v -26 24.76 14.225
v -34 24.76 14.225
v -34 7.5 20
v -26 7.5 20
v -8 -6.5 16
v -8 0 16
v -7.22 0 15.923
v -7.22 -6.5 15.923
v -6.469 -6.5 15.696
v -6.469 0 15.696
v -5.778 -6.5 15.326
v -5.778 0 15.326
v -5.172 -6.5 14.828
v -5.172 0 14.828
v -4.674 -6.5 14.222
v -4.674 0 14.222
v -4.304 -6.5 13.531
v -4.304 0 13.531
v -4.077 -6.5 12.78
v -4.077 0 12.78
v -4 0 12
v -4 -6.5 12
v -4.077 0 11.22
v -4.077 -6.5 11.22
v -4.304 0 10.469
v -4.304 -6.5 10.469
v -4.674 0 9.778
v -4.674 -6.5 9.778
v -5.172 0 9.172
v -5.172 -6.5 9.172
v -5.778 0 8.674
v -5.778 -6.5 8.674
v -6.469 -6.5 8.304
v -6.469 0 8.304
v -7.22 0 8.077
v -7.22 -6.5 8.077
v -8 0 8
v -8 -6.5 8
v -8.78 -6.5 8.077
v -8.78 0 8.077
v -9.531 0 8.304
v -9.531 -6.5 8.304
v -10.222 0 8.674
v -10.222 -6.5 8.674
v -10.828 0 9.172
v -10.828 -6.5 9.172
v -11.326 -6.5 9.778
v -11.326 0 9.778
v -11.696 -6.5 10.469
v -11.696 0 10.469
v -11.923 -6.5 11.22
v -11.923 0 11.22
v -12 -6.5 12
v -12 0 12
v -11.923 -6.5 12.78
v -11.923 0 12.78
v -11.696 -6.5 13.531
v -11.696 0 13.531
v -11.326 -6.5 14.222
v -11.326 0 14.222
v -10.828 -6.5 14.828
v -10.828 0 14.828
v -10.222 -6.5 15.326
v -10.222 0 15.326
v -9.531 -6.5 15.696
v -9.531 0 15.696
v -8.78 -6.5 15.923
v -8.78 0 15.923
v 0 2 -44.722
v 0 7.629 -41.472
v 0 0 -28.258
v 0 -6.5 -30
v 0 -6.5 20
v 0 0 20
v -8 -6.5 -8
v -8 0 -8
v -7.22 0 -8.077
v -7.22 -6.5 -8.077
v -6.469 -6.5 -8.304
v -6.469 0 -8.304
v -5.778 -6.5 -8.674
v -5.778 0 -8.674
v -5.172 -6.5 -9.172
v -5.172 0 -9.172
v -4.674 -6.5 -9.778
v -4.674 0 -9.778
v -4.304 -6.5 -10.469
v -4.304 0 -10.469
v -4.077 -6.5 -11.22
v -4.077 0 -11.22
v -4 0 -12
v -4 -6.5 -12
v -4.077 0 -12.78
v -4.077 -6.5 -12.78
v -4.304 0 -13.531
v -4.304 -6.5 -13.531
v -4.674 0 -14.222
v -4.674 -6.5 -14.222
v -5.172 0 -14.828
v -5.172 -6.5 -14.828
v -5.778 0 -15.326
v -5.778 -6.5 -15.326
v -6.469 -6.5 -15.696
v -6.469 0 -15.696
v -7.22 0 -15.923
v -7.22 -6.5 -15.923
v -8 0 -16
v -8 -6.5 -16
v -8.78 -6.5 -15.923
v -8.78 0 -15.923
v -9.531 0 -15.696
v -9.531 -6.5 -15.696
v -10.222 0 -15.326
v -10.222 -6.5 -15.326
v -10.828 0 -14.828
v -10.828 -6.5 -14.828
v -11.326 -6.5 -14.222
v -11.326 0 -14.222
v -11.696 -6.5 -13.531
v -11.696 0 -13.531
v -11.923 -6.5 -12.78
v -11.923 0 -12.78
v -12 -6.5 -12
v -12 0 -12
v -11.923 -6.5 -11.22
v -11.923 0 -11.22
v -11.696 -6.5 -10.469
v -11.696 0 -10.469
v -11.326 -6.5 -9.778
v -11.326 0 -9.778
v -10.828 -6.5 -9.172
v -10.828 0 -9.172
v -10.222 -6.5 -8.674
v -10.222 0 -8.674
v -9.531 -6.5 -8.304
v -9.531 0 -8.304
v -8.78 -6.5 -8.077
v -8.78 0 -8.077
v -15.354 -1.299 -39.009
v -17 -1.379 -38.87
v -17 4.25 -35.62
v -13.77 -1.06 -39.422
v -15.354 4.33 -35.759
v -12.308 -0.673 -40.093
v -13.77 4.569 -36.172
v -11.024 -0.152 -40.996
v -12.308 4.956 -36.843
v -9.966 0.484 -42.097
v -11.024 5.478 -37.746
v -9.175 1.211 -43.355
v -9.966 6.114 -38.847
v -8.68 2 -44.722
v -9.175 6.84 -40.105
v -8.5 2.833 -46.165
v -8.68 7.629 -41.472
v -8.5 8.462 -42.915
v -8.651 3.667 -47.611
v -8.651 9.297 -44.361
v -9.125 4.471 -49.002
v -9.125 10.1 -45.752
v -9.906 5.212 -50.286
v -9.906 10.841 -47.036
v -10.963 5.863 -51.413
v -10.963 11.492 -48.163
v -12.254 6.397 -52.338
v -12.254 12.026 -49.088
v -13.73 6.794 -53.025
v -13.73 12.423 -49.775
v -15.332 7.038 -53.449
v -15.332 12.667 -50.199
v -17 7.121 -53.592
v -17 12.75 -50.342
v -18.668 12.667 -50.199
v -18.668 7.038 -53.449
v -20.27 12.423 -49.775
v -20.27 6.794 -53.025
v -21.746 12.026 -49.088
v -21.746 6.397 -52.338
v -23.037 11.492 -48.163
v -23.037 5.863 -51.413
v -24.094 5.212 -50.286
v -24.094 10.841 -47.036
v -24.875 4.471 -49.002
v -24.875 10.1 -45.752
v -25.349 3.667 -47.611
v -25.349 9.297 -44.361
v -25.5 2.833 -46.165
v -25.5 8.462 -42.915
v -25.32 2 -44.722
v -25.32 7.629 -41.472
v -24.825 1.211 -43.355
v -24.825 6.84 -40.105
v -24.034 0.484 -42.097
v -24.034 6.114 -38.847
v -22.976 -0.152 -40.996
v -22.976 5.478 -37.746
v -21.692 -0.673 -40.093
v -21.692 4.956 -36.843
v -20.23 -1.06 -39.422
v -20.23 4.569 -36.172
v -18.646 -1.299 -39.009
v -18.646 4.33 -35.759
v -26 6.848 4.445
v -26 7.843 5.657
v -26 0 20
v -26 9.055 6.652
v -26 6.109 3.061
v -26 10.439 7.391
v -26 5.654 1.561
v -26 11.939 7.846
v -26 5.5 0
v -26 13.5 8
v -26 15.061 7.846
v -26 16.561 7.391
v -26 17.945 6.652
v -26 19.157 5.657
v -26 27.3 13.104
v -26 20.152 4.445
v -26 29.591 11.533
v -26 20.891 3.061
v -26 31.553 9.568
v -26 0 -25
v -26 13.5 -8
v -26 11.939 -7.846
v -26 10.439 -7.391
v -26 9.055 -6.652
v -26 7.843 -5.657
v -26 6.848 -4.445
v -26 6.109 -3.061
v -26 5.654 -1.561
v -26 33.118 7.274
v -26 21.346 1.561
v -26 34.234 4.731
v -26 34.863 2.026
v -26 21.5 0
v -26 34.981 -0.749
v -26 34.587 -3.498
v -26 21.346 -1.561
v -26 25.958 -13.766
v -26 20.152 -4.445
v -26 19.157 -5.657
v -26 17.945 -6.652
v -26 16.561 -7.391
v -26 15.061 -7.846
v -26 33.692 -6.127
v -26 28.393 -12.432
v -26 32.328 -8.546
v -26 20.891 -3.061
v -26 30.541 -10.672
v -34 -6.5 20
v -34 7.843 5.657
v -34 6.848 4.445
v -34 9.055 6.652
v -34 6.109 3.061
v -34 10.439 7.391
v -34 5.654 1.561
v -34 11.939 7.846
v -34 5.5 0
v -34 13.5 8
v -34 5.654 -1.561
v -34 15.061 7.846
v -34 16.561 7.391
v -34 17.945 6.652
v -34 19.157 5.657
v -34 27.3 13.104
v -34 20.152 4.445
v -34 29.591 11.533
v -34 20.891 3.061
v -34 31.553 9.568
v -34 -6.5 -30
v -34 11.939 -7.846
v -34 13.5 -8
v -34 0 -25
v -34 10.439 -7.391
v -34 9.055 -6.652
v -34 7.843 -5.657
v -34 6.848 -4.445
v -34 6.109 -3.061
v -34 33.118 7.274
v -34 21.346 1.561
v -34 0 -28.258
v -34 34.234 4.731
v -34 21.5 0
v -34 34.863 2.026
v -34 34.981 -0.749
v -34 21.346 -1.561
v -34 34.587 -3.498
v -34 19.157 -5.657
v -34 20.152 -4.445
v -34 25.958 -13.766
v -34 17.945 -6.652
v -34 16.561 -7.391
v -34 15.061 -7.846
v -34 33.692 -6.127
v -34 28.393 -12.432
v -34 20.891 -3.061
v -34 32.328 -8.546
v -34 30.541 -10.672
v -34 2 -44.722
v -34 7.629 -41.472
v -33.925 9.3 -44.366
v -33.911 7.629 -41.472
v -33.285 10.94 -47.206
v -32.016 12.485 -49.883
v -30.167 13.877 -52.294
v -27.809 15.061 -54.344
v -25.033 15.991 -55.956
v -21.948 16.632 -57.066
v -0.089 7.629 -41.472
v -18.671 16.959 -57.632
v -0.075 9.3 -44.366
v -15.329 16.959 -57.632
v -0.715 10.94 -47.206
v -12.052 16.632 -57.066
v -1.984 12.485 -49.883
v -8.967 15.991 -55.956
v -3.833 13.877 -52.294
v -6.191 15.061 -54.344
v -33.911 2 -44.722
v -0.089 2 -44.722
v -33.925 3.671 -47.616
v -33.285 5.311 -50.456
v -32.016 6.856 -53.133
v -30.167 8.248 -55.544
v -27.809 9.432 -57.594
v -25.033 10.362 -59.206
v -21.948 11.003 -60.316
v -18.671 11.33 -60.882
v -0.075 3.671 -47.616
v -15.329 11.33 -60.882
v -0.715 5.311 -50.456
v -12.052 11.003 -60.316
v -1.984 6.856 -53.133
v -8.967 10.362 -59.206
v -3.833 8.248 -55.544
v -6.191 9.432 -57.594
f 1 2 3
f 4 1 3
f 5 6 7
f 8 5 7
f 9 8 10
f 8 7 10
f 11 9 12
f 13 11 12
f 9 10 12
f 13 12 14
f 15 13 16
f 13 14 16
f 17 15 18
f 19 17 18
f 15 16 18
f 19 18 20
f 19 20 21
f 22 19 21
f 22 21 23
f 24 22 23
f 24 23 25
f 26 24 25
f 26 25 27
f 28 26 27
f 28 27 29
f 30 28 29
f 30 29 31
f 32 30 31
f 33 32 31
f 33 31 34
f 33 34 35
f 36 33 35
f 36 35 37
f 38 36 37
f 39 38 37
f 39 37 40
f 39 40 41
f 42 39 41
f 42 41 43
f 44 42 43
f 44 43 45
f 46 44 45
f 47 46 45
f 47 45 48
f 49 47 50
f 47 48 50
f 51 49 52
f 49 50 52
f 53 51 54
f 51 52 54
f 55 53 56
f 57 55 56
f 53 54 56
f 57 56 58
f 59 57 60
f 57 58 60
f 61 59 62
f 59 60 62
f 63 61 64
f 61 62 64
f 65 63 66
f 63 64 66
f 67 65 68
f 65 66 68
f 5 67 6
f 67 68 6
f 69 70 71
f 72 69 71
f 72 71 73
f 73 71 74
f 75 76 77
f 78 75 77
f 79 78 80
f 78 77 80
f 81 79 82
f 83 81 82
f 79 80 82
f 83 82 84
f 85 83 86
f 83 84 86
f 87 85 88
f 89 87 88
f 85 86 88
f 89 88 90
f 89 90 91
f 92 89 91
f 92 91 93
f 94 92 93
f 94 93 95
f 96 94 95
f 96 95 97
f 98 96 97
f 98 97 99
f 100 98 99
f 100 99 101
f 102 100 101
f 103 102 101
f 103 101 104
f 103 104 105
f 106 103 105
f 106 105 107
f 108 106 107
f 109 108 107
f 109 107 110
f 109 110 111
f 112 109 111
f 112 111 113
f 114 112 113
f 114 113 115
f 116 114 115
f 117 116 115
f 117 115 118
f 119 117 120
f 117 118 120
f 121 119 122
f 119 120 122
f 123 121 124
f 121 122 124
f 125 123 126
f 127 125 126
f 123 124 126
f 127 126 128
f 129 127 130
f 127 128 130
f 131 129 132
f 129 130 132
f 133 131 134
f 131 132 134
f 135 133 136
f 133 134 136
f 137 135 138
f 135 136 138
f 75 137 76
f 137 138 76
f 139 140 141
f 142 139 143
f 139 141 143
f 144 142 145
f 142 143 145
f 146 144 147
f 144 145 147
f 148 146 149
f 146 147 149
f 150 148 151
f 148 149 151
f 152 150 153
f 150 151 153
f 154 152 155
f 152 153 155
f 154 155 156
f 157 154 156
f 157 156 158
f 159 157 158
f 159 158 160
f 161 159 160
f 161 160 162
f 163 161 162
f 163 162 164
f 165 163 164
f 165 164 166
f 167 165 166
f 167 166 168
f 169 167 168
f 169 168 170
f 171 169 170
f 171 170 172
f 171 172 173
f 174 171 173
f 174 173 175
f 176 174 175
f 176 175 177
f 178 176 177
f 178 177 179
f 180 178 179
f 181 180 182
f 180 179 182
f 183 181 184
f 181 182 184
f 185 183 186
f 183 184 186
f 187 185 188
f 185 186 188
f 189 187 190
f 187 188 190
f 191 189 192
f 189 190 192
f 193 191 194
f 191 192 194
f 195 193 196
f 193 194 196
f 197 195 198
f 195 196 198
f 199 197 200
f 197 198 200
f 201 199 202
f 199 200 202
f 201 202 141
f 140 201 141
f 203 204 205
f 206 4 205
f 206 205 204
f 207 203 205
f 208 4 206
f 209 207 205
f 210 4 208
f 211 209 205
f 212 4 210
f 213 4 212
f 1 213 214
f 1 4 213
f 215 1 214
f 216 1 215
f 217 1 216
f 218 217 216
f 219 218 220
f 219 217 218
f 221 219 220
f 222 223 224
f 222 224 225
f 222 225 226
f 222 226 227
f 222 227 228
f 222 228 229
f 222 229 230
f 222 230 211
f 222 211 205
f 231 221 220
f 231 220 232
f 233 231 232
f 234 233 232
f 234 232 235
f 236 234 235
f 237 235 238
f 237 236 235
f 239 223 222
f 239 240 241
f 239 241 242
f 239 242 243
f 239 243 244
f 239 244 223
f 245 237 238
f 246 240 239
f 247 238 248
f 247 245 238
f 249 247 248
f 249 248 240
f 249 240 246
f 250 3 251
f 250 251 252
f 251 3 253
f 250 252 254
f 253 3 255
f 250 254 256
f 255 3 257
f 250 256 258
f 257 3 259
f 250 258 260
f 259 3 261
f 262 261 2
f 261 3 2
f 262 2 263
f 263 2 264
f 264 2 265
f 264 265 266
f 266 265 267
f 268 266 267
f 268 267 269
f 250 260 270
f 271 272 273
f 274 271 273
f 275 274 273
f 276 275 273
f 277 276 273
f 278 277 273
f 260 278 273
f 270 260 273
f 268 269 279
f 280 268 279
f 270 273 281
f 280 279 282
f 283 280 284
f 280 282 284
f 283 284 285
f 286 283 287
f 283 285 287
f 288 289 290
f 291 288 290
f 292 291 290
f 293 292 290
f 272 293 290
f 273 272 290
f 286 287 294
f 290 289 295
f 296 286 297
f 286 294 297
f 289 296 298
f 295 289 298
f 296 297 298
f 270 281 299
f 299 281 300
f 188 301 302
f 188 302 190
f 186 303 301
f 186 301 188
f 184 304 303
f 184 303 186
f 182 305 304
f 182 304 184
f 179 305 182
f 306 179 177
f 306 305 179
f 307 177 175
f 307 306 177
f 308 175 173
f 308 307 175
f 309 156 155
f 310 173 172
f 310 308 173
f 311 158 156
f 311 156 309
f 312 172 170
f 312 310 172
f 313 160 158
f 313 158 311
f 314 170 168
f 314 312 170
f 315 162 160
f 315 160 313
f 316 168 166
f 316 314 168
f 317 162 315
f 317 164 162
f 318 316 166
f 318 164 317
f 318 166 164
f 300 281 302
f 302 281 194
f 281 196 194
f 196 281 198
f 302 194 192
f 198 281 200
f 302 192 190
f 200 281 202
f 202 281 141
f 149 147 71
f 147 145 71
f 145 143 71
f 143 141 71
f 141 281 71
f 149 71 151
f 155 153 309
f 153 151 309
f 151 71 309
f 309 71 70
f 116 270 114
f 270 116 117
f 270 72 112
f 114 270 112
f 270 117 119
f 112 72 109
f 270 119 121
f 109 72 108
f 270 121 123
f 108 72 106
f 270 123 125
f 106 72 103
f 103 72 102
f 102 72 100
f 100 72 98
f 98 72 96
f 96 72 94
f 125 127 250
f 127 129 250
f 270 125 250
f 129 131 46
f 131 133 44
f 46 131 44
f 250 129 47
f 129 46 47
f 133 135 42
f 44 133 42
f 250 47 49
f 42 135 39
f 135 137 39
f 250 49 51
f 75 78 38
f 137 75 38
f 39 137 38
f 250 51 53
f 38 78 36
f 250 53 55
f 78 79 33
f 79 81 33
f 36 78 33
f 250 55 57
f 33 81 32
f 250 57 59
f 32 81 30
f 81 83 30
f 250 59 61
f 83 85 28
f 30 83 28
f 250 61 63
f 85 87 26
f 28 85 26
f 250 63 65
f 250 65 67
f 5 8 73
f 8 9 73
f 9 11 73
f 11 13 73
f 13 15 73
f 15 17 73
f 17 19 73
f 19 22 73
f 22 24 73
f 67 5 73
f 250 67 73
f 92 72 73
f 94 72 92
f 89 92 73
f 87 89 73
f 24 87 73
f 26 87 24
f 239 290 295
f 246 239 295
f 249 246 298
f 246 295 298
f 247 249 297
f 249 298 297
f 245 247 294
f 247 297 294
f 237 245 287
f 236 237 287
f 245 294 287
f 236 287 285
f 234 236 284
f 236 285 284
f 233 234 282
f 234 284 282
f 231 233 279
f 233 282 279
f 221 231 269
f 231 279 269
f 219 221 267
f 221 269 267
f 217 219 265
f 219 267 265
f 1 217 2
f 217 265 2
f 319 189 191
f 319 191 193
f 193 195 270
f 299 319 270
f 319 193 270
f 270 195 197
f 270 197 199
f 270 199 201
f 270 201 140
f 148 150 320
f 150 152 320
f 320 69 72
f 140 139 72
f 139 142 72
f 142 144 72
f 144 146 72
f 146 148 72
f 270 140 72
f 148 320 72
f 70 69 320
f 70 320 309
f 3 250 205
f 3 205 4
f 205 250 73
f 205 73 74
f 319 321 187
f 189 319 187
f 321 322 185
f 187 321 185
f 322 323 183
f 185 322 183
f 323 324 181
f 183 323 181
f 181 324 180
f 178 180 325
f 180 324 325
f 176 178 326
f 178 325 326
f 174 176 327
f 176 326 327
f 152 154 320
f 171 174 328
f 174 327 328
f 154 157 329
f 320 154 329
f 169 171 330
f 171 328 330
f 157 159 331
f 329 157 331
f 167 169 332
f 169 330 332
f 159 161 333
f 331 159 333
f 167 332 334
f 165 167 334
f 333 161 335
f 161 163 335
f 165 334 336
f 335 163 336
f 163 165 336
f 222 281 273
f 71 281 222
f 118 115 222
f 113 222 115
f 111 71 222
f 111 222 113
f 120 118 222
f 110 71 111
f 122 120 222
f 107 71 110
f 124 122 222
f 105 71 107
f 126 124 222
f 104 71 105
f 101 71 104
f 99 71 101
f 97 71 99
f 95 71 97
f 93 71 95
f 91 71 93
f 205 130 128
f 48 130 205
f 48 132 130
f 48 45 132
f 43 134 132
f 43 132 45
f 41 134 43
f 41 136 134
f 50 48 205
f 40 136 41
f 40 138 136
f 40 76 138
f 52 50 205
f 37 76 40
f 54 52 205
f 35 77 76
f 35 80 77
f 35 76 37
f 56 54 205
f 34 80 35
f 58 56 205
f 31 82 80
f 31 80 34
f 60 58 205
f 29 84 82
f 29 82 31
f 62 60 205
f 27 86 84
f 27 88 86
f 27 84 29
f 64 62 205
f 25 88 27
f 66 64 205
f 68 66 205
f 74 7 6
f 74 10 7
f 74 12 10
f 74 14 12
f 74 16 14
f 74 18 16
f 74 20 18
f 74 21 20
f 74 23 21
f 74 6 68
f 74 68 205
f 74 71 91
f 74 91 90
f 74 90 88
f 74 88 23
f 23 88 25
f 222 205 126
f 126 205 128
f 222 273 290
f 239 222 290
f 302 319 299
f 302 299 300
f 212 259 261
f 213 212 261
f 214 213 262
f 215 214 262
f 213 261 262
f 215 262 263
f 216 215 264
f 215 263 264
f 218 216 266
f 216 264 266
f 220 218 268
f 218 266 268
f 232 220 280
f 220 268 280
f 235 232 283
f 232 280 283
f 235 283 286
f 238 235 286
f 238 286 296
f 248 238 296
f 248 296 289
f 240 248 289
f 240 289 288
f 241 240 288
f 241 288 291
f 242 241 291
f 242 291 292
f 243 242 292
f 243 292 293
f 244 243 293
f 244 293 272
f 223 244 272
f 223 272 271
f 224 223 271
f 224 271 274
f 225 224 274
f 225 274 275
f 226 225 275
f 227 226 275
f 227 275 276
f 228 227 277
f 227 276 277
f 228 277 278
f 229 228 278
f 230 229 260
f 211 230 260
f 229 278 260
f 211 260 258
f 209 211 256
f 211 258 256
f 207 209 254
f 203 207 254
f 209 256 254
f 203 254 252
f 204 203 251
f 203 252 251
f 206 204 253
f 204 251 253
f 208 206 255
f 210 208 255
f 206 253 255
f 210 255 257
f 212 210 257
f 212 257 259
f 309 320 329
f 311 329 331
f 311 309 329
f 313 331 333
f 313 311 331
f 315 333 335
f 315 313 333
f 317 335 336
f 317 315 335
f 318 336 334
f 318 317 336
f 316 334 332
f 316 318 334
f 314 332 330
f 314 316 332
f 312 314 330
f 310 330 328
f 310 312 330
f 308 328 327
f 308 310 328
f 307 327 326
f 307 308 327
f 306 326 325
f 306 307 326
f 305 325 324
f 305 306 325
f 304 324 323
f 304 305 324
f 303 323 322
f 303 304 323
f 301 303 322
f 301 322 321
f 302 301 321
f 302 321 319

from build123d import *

# Parameters (mm, degrees)
EXTRUDE_1_DEPTH     = 34
CUT_EXTRUDE_1_REACH = 72.355
SKETCH_2_R          = 4
EXTRUDE_2_DEPTH     = 8
CUT_EXTRUDE_2_REACH = 78.907
SKETCH_4_R          = 8
CUT_EXTRUDE_3_REACH = 80.3
SKETCH_6_R          = 8.5
CUT_EXTRUDE_4_REACH = 78.907
SKETCH_9_R          = 17
EXTRUDE_5_DEPTH     = 6.5
CUT_EXTRUDE_6_REACH = 81.317
SKETCH_13_R         = 8.5


with BuildPart() as part:
    # 草图1 → 凸台-拉伸1 (new body)
    with BuildSketch(Plane(origin=(0, 0, 0), x_dir=(0, 0, -1), z_dir=(1, 0, 0))):
        Polygon((0, 0), (28.258330249, 0), (56.194863729, 16.129165125), (59.444863729, 10.5), (30, -6.5), (-20, -6.5), (-20, 0), align=None)
    extrude(amount=-EXTRUDE_1_DEPTH)

    # 草图2 → 切除-拉伸1 (cut, up to next)
    with BuildSketch(Plane(origin=(0, 0, 0), x_dir=(1, 0, 0), z_dir=(0, 1, 0)), mode=Mode.PRIVATE) as cut_extrude_1_sk1:
        with Locations(Location((-8, -12, 0), (0, 0, 270))):
            Circle(SKETCH_2_R)
    cut_extrude_1_tool1 = extrude(cut_extrude_1_sk1.sketch, amount=-CUT_EXTRUDE_1_REACH, mode=Mode.PRIVATE) & part.part
    # 草图2 → 切除-拉伸1 (cut, up to next)
    with BuildSketch(Plane(origin=(0, 0, 0), x_dir=(1, 0, 0), z_dir=(0, 1, 0)), mode=Mode.PRIVATE) as cut_extrude_1_sk2:
        with Locations(Location((-8, 12, 0), (0, 0, 270))):
            Circle(SKETCH_2_R)
    cut_extrude_1_tool2 = extrude(cut_extrude_1_sk2.sketch, amount=-CUT_EXTRUDE_1_REACH, mode=Mode.PRIVATE) & part.part
    add(cut_extrude_1_tool1.solids().sort_by_distance((-8, 0, 12))[0], mode=Mode.SUBTRACT)
    add(cut_extrude_1_tool2.solids().sort_by_distance((-8, 0, -12))[0], mode=Mode.SUBTRACT)

    # 草图3 → 凸台-拉伸2 (add)
    with BuildSketch(Plane.ZY.offset(34)):
        with BuildLine():
            Line((-25, 0), (-13.76612817, 25.957660212))
            ThreePointArc((-13.76612817, 25.957660212), (0.641385669, 34.986281207), (14.224811704, 24.759698727))
            Line((14.224811704, 24.759698727), (20, 7.5))
            Line((20, 7.5), (20, 0))
            Line((20, 0), (-25, 0))
        make_face()
    extrude(amount=-EXTRUDE_2_DEPTH)

    # 草图4 → 切除-拉伸2 (cut, up to next)
    with BuildSketch(Plane.ZY.offset(34), mode=Mode.PRIVATE) as cut_extrude_2_sk1:
        with Locations((0, 13.5)):
            Circle(SKETCH_4_R)
    cut_extrude_2_tool1 = extrude(cut_extrude_2_sk1.sketch, amount=-CUT_EXTRUDE_2_REACH, mode=Mode.PRIVATE) & part.part
    add(cut_extrude_2_tool1.solids().sort_by_distance((-34, 13.5, 0))[0], mode=Mode.SUBTRACT)

    # 草图6 → 切除-拉伸3 (cut, up to next)
    with BuildSketch(Plane(origin=(0, -12.236215932, -7.064582562), x_dir=(1, 0, 0), z_dir=(0, 0.8660254037844378, 0.5000000000000017)), mode=Mode.PRIVATE) as cut_extrude_3_sk1:
        with Locations(Location((-17, 41.472431864, 0), (0, 0, 270))):
            Circle(SKETCH_6_R)
    cut_extrude_3_tool1 = extrude(cut_extrude_3_sk1.sketch, amount=-CUT_EXTRUDE_3_REACH, mode=Mode.PRIVATE) & part.part
    add(cut_extrude_3_tool1.solids().sort_by_distance((-17, 8.5, -42.980762))[0], mode=Mode.SUBTRACT)

    # 草图8 → 切除-拉伸4 (cut, up to next)
    with BuildSketch(Plane(origin=(0, 0, 0), x_dir=(0, 0, -1), z_dir=(1, 0, 0)), mode=Mode.PRIVATE) as cut_extrude_4_sk1:
        Polygon((44.722431864, 2), (41.472431864, 7.629165125), (56.194863729, 16.129165125), (59.444863729, 10.5), align=None)
    cut_extrude_4_tool1 = extrude(cut_extrude_4_sk1.sketch, amount=-CUT_EXTRUDE_4_REACH, mode=Mode.PRIVATE) & part.part
    add(cut_extrude_4_tool1.solids().sort_by_distance((0, 9.064583, -50.458648))[0], mode=Mode.SUBTRACT)

    # 草图9 → 凸台-拉伸5 (add)
    with BuildSketch(Plane(origin=(0, -12.236215932, -7.064582562), x_dir=(1, 0, 0), z_dir=(0, 0.8660254037844378, 0.5000000000000017))):
        with Locations((-17, 41.472431864)):
            Circle(SKETCH_9_R)
    extrude(amount=-EXTRUDE_5_DEPTH)

    # 草图13 → 切除-拉伸6 (cut, up to next)
    with BuildSketch(Plane(origin=(0, -12.236215932, -7.064582562), x_dir=(1, 0, 0), z_dir=(0, 0.8660254037844378, 0.5000000000000017)), mode=Mode.PRIVATE) as cut_extrude_6_sk1:
        with Locations(Location((-17, 41.472431864, 0), (0, 0, 270))):
            Circle(SKETCH_13_R)
    cut_extrude_6_tool1 = extrude(cut_extrude_6_sk1.sketch, amount=-CUT_EXTRUDE_6_REACH, mode=Mode.PRIVATE) & part.part
    add(cut_extrude_6_tool1.solids().sort_by_distance((-17, 8.5, -42.980762))[0], mode=Mode.SUBTRACT)


solid = part.part
